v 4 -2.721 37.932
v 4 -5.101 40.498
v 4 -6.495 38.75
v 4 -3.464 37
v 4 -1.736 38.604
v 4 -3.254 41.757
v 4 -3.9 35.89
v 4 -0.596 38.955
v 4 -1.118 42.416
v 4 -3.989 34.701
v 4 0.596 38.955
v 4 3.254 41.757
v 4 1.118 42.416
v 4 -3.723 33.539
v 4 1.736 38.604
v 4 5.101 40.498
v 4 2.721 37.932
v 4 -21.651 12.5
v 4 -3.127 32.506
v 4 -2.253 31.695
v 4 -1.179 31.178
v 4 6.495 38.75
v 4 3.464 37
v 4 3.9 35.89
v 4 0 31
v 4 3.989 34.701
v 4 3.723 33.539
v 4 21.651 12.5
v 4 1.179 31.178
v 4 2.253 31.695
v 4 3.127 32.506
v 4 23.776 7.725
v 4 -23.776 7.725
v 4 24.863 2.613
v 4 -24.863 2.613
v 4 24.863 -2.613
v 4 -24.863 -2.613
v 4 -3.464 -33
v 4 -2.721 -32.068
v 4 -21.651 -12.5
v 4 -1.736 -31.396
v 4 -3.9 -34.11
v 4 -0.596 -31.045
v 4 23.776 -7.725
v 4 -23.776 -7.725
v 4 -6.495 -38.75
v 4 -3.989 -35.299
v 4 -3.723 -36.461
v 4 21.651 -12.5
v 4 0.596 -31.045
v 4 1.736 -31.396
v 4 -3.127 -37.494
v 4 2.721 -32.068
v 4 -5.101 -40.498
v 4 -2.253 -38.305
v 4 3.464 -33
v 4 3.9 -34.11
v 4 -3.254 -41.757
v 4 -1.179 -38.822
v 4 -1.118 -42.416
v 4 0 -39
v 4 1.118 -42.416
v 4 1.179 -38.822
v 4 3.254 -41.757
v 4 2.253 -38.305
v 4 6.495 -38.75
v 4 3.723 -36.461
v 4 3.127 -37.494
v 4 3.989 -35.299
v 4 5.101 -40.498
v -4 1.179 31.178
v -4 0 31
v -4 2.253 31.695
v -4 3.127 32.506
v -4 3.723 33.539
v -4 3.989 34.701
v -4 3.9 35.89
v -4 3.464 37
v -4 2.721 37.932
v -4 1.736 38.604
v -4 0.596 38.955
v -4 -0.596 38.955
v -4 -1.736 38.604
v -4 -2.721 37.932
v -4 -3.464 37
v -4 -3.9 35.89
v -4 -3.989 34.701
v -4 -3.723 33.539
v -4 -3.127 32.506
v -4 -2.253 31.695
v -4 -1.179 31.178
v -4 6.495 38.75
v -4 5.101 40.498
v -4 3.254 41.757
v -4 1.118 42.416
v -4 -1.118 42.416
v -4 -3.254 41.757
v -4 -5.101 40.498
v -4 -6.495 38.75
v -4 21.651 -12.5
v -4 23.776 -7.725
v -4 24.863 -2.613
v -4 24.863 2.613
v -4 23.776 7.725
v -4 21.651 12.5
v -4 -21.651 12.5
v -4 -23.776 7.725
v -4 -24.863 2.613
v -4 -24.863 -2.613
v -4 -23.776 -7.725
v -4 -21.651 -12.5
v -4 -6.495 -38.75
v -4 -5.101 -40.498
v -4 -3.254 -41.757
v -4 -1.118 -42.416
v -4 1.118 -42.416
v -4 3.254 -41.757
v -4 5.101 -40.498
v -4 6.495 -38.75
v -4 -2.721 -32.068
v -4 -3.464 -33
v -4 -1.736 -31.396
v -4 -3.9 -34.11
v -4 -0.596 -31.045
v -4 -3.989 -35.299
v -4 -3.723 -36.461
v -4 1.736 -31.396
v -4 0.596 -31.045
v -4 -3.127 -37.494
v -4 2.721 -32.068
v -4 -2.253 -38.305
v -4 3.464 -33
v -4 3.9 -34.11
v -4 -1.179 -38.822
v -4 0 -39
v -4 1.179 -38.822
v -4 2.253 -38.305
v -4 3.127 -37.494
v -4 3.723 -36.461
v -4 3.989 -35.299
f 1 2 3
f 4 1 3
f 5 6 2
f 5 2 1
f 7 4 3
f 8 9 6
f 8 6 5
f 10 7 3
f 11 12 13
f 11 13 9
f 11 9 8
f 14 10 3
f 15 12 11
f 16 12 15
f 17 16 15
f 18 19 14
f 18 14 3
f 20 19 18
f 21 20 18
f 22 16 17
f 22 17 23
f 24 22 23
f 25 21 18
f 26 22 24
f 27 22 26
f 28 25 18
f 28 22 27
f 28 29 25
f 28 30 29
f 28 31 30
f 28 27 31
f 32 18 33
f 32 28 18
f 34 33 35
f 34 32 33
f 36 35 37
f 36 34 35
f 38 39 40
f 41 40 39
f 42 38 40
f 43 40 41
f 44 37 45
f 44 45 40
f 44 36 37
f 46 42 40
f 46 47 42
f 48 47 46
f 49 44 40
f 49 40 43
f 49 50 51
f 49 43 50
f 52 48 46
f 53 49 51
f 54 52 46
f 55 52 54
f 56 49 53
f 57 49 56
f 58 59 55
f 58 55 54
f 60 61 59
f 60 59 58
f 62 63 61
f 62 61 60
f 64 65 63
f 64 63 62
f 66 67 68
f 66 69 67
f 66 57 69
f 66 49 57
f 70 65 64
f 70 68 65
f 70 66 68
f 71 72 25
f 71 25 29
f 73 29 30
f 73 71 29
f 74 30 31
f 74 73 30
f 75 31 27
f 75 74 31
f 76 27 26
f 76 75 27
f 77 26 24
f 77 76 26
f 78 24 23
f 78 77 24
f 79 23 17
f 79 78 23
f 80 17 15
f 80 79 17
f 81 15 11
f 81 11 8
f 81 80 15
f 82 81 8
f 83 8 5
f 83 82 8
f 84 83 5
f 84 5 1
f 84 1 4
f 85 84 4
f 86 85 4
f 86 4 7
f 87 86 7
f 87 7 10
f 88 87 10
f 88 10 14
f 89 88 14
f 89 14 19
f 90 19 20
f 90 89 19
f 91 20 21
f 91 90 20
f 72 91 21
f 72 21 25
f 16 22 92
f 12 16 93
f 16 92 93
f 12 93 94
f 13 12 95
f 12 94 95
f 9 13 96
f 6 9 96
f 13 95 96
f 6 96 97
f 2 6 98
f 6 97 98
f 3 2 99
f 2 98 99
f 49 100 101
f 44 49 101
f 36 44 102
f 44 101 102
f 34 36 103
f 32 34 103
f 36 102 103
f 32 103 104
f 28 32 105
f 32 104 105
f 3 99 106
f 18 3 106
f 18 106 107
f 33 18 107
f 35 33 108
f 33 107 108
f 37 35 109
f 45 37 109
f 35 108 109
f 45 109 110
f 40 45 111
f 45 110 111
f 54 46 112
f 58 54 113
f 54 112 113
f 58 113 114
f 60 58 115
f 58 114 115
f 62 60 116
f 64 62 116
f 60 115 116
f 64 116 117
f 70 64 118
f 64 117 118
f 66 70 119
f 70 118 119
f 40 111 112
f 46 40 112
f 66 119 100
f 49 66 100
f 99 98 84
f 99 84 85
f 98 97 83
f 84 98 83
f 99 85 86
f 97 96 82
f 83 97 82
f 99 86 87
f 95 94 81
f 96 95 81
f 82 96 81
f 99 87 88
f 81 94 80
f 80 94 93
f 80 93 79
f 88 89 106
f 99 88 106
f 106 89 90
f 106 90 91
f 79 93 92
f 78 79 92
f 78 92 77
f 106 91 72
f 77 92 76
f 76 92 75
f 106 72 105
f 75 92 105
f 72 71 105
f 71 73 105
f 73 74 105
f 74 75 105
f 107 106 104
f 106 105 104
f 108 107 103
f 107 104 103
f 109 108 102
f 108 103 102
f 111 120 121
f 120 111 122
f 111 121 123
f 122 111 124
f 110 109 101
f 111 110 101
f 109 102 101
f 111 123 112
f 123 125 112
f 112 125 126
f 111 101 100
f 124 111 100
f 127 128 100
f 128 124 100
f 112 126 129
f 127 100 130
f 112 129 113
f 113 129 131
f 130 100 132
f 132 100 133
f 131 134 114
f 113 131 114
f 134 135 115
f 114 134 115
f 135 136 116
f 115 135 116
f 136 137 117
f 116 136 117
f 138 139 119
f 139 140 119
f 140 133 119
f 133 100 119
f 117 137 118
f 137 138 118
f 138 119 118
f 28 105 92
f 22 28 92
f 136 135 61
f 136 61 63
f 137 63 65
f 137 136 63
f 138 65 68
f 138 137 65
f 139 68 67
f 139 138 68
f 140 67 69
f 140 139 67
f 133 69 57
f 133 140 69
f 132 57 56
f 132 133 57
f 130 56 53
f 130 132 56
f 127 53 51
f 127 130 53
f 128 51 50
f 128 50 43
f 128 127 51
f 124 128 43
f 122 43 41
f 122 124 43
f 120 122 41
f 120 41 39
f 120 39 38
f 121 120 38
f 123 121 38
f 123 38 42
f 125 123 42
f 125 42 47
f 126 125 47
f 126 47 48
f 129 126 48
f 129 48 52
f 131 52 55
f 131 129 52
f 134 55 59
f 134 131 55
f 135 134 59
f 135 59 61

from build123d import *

# Parameters (mm, degrees)
BOSS_EXTRUDE1_DEPTH      = 4
BOSS_EXTRUDE1_DEPTH_BACK = 4
SKETCH1_R                = 4


with BuildPart() as part:
    # Sketch1 → Boss-Extrude1 (new, two sides: drawn at the far end of the back side and taken through both)
    with BuildSketch(Plane(origin=(0, 0, 0), x_dir=(0, 0, -1), z_dir=(1, 0, 0)).offset(-BOSS_EXTRUDE1_DEPTH_BACK)):
        with BuildLine():
            ThreePointArc((-38.75, 6.495190528), (-42.5, 0), (-38.75, -6.495190528))
            Line((-38.75, -6.495190528), (-12.5, -21.650635095))
            ThreePointArc((-12.5, -21.650635095), (0, -25), (12.5, -21.650635095))
            Line((12.5, -21.650635095), (38.75, -6.495190528))
            ThreePointArc((38.75, -6.495190528), (42.5, 0), (38.75, 6.495190528))
            Line((38.75, 6.495190528), (12.5, 21.650635095))
            ThreePointArc((12.5, 21.650635095), (0, 25), (-12.5, 21.650635095))
            Line((-12.5, 21.650635095), (-38.75, 6.495190528))
        make_face()
        with Locations((-35, 0)):
            Circle(SKETCH1_R, mode=Mode.SUBTRACT)
        with Locations((35, 0)):
            Circle(SKETCH1_R, mode=Mode.SUBTRACT)
    extrude(amount=BOSS_EXTRUDE1_DEPTH + BOSS_EXTRUDE1_DEPTH_BACK)


solid = part.part
